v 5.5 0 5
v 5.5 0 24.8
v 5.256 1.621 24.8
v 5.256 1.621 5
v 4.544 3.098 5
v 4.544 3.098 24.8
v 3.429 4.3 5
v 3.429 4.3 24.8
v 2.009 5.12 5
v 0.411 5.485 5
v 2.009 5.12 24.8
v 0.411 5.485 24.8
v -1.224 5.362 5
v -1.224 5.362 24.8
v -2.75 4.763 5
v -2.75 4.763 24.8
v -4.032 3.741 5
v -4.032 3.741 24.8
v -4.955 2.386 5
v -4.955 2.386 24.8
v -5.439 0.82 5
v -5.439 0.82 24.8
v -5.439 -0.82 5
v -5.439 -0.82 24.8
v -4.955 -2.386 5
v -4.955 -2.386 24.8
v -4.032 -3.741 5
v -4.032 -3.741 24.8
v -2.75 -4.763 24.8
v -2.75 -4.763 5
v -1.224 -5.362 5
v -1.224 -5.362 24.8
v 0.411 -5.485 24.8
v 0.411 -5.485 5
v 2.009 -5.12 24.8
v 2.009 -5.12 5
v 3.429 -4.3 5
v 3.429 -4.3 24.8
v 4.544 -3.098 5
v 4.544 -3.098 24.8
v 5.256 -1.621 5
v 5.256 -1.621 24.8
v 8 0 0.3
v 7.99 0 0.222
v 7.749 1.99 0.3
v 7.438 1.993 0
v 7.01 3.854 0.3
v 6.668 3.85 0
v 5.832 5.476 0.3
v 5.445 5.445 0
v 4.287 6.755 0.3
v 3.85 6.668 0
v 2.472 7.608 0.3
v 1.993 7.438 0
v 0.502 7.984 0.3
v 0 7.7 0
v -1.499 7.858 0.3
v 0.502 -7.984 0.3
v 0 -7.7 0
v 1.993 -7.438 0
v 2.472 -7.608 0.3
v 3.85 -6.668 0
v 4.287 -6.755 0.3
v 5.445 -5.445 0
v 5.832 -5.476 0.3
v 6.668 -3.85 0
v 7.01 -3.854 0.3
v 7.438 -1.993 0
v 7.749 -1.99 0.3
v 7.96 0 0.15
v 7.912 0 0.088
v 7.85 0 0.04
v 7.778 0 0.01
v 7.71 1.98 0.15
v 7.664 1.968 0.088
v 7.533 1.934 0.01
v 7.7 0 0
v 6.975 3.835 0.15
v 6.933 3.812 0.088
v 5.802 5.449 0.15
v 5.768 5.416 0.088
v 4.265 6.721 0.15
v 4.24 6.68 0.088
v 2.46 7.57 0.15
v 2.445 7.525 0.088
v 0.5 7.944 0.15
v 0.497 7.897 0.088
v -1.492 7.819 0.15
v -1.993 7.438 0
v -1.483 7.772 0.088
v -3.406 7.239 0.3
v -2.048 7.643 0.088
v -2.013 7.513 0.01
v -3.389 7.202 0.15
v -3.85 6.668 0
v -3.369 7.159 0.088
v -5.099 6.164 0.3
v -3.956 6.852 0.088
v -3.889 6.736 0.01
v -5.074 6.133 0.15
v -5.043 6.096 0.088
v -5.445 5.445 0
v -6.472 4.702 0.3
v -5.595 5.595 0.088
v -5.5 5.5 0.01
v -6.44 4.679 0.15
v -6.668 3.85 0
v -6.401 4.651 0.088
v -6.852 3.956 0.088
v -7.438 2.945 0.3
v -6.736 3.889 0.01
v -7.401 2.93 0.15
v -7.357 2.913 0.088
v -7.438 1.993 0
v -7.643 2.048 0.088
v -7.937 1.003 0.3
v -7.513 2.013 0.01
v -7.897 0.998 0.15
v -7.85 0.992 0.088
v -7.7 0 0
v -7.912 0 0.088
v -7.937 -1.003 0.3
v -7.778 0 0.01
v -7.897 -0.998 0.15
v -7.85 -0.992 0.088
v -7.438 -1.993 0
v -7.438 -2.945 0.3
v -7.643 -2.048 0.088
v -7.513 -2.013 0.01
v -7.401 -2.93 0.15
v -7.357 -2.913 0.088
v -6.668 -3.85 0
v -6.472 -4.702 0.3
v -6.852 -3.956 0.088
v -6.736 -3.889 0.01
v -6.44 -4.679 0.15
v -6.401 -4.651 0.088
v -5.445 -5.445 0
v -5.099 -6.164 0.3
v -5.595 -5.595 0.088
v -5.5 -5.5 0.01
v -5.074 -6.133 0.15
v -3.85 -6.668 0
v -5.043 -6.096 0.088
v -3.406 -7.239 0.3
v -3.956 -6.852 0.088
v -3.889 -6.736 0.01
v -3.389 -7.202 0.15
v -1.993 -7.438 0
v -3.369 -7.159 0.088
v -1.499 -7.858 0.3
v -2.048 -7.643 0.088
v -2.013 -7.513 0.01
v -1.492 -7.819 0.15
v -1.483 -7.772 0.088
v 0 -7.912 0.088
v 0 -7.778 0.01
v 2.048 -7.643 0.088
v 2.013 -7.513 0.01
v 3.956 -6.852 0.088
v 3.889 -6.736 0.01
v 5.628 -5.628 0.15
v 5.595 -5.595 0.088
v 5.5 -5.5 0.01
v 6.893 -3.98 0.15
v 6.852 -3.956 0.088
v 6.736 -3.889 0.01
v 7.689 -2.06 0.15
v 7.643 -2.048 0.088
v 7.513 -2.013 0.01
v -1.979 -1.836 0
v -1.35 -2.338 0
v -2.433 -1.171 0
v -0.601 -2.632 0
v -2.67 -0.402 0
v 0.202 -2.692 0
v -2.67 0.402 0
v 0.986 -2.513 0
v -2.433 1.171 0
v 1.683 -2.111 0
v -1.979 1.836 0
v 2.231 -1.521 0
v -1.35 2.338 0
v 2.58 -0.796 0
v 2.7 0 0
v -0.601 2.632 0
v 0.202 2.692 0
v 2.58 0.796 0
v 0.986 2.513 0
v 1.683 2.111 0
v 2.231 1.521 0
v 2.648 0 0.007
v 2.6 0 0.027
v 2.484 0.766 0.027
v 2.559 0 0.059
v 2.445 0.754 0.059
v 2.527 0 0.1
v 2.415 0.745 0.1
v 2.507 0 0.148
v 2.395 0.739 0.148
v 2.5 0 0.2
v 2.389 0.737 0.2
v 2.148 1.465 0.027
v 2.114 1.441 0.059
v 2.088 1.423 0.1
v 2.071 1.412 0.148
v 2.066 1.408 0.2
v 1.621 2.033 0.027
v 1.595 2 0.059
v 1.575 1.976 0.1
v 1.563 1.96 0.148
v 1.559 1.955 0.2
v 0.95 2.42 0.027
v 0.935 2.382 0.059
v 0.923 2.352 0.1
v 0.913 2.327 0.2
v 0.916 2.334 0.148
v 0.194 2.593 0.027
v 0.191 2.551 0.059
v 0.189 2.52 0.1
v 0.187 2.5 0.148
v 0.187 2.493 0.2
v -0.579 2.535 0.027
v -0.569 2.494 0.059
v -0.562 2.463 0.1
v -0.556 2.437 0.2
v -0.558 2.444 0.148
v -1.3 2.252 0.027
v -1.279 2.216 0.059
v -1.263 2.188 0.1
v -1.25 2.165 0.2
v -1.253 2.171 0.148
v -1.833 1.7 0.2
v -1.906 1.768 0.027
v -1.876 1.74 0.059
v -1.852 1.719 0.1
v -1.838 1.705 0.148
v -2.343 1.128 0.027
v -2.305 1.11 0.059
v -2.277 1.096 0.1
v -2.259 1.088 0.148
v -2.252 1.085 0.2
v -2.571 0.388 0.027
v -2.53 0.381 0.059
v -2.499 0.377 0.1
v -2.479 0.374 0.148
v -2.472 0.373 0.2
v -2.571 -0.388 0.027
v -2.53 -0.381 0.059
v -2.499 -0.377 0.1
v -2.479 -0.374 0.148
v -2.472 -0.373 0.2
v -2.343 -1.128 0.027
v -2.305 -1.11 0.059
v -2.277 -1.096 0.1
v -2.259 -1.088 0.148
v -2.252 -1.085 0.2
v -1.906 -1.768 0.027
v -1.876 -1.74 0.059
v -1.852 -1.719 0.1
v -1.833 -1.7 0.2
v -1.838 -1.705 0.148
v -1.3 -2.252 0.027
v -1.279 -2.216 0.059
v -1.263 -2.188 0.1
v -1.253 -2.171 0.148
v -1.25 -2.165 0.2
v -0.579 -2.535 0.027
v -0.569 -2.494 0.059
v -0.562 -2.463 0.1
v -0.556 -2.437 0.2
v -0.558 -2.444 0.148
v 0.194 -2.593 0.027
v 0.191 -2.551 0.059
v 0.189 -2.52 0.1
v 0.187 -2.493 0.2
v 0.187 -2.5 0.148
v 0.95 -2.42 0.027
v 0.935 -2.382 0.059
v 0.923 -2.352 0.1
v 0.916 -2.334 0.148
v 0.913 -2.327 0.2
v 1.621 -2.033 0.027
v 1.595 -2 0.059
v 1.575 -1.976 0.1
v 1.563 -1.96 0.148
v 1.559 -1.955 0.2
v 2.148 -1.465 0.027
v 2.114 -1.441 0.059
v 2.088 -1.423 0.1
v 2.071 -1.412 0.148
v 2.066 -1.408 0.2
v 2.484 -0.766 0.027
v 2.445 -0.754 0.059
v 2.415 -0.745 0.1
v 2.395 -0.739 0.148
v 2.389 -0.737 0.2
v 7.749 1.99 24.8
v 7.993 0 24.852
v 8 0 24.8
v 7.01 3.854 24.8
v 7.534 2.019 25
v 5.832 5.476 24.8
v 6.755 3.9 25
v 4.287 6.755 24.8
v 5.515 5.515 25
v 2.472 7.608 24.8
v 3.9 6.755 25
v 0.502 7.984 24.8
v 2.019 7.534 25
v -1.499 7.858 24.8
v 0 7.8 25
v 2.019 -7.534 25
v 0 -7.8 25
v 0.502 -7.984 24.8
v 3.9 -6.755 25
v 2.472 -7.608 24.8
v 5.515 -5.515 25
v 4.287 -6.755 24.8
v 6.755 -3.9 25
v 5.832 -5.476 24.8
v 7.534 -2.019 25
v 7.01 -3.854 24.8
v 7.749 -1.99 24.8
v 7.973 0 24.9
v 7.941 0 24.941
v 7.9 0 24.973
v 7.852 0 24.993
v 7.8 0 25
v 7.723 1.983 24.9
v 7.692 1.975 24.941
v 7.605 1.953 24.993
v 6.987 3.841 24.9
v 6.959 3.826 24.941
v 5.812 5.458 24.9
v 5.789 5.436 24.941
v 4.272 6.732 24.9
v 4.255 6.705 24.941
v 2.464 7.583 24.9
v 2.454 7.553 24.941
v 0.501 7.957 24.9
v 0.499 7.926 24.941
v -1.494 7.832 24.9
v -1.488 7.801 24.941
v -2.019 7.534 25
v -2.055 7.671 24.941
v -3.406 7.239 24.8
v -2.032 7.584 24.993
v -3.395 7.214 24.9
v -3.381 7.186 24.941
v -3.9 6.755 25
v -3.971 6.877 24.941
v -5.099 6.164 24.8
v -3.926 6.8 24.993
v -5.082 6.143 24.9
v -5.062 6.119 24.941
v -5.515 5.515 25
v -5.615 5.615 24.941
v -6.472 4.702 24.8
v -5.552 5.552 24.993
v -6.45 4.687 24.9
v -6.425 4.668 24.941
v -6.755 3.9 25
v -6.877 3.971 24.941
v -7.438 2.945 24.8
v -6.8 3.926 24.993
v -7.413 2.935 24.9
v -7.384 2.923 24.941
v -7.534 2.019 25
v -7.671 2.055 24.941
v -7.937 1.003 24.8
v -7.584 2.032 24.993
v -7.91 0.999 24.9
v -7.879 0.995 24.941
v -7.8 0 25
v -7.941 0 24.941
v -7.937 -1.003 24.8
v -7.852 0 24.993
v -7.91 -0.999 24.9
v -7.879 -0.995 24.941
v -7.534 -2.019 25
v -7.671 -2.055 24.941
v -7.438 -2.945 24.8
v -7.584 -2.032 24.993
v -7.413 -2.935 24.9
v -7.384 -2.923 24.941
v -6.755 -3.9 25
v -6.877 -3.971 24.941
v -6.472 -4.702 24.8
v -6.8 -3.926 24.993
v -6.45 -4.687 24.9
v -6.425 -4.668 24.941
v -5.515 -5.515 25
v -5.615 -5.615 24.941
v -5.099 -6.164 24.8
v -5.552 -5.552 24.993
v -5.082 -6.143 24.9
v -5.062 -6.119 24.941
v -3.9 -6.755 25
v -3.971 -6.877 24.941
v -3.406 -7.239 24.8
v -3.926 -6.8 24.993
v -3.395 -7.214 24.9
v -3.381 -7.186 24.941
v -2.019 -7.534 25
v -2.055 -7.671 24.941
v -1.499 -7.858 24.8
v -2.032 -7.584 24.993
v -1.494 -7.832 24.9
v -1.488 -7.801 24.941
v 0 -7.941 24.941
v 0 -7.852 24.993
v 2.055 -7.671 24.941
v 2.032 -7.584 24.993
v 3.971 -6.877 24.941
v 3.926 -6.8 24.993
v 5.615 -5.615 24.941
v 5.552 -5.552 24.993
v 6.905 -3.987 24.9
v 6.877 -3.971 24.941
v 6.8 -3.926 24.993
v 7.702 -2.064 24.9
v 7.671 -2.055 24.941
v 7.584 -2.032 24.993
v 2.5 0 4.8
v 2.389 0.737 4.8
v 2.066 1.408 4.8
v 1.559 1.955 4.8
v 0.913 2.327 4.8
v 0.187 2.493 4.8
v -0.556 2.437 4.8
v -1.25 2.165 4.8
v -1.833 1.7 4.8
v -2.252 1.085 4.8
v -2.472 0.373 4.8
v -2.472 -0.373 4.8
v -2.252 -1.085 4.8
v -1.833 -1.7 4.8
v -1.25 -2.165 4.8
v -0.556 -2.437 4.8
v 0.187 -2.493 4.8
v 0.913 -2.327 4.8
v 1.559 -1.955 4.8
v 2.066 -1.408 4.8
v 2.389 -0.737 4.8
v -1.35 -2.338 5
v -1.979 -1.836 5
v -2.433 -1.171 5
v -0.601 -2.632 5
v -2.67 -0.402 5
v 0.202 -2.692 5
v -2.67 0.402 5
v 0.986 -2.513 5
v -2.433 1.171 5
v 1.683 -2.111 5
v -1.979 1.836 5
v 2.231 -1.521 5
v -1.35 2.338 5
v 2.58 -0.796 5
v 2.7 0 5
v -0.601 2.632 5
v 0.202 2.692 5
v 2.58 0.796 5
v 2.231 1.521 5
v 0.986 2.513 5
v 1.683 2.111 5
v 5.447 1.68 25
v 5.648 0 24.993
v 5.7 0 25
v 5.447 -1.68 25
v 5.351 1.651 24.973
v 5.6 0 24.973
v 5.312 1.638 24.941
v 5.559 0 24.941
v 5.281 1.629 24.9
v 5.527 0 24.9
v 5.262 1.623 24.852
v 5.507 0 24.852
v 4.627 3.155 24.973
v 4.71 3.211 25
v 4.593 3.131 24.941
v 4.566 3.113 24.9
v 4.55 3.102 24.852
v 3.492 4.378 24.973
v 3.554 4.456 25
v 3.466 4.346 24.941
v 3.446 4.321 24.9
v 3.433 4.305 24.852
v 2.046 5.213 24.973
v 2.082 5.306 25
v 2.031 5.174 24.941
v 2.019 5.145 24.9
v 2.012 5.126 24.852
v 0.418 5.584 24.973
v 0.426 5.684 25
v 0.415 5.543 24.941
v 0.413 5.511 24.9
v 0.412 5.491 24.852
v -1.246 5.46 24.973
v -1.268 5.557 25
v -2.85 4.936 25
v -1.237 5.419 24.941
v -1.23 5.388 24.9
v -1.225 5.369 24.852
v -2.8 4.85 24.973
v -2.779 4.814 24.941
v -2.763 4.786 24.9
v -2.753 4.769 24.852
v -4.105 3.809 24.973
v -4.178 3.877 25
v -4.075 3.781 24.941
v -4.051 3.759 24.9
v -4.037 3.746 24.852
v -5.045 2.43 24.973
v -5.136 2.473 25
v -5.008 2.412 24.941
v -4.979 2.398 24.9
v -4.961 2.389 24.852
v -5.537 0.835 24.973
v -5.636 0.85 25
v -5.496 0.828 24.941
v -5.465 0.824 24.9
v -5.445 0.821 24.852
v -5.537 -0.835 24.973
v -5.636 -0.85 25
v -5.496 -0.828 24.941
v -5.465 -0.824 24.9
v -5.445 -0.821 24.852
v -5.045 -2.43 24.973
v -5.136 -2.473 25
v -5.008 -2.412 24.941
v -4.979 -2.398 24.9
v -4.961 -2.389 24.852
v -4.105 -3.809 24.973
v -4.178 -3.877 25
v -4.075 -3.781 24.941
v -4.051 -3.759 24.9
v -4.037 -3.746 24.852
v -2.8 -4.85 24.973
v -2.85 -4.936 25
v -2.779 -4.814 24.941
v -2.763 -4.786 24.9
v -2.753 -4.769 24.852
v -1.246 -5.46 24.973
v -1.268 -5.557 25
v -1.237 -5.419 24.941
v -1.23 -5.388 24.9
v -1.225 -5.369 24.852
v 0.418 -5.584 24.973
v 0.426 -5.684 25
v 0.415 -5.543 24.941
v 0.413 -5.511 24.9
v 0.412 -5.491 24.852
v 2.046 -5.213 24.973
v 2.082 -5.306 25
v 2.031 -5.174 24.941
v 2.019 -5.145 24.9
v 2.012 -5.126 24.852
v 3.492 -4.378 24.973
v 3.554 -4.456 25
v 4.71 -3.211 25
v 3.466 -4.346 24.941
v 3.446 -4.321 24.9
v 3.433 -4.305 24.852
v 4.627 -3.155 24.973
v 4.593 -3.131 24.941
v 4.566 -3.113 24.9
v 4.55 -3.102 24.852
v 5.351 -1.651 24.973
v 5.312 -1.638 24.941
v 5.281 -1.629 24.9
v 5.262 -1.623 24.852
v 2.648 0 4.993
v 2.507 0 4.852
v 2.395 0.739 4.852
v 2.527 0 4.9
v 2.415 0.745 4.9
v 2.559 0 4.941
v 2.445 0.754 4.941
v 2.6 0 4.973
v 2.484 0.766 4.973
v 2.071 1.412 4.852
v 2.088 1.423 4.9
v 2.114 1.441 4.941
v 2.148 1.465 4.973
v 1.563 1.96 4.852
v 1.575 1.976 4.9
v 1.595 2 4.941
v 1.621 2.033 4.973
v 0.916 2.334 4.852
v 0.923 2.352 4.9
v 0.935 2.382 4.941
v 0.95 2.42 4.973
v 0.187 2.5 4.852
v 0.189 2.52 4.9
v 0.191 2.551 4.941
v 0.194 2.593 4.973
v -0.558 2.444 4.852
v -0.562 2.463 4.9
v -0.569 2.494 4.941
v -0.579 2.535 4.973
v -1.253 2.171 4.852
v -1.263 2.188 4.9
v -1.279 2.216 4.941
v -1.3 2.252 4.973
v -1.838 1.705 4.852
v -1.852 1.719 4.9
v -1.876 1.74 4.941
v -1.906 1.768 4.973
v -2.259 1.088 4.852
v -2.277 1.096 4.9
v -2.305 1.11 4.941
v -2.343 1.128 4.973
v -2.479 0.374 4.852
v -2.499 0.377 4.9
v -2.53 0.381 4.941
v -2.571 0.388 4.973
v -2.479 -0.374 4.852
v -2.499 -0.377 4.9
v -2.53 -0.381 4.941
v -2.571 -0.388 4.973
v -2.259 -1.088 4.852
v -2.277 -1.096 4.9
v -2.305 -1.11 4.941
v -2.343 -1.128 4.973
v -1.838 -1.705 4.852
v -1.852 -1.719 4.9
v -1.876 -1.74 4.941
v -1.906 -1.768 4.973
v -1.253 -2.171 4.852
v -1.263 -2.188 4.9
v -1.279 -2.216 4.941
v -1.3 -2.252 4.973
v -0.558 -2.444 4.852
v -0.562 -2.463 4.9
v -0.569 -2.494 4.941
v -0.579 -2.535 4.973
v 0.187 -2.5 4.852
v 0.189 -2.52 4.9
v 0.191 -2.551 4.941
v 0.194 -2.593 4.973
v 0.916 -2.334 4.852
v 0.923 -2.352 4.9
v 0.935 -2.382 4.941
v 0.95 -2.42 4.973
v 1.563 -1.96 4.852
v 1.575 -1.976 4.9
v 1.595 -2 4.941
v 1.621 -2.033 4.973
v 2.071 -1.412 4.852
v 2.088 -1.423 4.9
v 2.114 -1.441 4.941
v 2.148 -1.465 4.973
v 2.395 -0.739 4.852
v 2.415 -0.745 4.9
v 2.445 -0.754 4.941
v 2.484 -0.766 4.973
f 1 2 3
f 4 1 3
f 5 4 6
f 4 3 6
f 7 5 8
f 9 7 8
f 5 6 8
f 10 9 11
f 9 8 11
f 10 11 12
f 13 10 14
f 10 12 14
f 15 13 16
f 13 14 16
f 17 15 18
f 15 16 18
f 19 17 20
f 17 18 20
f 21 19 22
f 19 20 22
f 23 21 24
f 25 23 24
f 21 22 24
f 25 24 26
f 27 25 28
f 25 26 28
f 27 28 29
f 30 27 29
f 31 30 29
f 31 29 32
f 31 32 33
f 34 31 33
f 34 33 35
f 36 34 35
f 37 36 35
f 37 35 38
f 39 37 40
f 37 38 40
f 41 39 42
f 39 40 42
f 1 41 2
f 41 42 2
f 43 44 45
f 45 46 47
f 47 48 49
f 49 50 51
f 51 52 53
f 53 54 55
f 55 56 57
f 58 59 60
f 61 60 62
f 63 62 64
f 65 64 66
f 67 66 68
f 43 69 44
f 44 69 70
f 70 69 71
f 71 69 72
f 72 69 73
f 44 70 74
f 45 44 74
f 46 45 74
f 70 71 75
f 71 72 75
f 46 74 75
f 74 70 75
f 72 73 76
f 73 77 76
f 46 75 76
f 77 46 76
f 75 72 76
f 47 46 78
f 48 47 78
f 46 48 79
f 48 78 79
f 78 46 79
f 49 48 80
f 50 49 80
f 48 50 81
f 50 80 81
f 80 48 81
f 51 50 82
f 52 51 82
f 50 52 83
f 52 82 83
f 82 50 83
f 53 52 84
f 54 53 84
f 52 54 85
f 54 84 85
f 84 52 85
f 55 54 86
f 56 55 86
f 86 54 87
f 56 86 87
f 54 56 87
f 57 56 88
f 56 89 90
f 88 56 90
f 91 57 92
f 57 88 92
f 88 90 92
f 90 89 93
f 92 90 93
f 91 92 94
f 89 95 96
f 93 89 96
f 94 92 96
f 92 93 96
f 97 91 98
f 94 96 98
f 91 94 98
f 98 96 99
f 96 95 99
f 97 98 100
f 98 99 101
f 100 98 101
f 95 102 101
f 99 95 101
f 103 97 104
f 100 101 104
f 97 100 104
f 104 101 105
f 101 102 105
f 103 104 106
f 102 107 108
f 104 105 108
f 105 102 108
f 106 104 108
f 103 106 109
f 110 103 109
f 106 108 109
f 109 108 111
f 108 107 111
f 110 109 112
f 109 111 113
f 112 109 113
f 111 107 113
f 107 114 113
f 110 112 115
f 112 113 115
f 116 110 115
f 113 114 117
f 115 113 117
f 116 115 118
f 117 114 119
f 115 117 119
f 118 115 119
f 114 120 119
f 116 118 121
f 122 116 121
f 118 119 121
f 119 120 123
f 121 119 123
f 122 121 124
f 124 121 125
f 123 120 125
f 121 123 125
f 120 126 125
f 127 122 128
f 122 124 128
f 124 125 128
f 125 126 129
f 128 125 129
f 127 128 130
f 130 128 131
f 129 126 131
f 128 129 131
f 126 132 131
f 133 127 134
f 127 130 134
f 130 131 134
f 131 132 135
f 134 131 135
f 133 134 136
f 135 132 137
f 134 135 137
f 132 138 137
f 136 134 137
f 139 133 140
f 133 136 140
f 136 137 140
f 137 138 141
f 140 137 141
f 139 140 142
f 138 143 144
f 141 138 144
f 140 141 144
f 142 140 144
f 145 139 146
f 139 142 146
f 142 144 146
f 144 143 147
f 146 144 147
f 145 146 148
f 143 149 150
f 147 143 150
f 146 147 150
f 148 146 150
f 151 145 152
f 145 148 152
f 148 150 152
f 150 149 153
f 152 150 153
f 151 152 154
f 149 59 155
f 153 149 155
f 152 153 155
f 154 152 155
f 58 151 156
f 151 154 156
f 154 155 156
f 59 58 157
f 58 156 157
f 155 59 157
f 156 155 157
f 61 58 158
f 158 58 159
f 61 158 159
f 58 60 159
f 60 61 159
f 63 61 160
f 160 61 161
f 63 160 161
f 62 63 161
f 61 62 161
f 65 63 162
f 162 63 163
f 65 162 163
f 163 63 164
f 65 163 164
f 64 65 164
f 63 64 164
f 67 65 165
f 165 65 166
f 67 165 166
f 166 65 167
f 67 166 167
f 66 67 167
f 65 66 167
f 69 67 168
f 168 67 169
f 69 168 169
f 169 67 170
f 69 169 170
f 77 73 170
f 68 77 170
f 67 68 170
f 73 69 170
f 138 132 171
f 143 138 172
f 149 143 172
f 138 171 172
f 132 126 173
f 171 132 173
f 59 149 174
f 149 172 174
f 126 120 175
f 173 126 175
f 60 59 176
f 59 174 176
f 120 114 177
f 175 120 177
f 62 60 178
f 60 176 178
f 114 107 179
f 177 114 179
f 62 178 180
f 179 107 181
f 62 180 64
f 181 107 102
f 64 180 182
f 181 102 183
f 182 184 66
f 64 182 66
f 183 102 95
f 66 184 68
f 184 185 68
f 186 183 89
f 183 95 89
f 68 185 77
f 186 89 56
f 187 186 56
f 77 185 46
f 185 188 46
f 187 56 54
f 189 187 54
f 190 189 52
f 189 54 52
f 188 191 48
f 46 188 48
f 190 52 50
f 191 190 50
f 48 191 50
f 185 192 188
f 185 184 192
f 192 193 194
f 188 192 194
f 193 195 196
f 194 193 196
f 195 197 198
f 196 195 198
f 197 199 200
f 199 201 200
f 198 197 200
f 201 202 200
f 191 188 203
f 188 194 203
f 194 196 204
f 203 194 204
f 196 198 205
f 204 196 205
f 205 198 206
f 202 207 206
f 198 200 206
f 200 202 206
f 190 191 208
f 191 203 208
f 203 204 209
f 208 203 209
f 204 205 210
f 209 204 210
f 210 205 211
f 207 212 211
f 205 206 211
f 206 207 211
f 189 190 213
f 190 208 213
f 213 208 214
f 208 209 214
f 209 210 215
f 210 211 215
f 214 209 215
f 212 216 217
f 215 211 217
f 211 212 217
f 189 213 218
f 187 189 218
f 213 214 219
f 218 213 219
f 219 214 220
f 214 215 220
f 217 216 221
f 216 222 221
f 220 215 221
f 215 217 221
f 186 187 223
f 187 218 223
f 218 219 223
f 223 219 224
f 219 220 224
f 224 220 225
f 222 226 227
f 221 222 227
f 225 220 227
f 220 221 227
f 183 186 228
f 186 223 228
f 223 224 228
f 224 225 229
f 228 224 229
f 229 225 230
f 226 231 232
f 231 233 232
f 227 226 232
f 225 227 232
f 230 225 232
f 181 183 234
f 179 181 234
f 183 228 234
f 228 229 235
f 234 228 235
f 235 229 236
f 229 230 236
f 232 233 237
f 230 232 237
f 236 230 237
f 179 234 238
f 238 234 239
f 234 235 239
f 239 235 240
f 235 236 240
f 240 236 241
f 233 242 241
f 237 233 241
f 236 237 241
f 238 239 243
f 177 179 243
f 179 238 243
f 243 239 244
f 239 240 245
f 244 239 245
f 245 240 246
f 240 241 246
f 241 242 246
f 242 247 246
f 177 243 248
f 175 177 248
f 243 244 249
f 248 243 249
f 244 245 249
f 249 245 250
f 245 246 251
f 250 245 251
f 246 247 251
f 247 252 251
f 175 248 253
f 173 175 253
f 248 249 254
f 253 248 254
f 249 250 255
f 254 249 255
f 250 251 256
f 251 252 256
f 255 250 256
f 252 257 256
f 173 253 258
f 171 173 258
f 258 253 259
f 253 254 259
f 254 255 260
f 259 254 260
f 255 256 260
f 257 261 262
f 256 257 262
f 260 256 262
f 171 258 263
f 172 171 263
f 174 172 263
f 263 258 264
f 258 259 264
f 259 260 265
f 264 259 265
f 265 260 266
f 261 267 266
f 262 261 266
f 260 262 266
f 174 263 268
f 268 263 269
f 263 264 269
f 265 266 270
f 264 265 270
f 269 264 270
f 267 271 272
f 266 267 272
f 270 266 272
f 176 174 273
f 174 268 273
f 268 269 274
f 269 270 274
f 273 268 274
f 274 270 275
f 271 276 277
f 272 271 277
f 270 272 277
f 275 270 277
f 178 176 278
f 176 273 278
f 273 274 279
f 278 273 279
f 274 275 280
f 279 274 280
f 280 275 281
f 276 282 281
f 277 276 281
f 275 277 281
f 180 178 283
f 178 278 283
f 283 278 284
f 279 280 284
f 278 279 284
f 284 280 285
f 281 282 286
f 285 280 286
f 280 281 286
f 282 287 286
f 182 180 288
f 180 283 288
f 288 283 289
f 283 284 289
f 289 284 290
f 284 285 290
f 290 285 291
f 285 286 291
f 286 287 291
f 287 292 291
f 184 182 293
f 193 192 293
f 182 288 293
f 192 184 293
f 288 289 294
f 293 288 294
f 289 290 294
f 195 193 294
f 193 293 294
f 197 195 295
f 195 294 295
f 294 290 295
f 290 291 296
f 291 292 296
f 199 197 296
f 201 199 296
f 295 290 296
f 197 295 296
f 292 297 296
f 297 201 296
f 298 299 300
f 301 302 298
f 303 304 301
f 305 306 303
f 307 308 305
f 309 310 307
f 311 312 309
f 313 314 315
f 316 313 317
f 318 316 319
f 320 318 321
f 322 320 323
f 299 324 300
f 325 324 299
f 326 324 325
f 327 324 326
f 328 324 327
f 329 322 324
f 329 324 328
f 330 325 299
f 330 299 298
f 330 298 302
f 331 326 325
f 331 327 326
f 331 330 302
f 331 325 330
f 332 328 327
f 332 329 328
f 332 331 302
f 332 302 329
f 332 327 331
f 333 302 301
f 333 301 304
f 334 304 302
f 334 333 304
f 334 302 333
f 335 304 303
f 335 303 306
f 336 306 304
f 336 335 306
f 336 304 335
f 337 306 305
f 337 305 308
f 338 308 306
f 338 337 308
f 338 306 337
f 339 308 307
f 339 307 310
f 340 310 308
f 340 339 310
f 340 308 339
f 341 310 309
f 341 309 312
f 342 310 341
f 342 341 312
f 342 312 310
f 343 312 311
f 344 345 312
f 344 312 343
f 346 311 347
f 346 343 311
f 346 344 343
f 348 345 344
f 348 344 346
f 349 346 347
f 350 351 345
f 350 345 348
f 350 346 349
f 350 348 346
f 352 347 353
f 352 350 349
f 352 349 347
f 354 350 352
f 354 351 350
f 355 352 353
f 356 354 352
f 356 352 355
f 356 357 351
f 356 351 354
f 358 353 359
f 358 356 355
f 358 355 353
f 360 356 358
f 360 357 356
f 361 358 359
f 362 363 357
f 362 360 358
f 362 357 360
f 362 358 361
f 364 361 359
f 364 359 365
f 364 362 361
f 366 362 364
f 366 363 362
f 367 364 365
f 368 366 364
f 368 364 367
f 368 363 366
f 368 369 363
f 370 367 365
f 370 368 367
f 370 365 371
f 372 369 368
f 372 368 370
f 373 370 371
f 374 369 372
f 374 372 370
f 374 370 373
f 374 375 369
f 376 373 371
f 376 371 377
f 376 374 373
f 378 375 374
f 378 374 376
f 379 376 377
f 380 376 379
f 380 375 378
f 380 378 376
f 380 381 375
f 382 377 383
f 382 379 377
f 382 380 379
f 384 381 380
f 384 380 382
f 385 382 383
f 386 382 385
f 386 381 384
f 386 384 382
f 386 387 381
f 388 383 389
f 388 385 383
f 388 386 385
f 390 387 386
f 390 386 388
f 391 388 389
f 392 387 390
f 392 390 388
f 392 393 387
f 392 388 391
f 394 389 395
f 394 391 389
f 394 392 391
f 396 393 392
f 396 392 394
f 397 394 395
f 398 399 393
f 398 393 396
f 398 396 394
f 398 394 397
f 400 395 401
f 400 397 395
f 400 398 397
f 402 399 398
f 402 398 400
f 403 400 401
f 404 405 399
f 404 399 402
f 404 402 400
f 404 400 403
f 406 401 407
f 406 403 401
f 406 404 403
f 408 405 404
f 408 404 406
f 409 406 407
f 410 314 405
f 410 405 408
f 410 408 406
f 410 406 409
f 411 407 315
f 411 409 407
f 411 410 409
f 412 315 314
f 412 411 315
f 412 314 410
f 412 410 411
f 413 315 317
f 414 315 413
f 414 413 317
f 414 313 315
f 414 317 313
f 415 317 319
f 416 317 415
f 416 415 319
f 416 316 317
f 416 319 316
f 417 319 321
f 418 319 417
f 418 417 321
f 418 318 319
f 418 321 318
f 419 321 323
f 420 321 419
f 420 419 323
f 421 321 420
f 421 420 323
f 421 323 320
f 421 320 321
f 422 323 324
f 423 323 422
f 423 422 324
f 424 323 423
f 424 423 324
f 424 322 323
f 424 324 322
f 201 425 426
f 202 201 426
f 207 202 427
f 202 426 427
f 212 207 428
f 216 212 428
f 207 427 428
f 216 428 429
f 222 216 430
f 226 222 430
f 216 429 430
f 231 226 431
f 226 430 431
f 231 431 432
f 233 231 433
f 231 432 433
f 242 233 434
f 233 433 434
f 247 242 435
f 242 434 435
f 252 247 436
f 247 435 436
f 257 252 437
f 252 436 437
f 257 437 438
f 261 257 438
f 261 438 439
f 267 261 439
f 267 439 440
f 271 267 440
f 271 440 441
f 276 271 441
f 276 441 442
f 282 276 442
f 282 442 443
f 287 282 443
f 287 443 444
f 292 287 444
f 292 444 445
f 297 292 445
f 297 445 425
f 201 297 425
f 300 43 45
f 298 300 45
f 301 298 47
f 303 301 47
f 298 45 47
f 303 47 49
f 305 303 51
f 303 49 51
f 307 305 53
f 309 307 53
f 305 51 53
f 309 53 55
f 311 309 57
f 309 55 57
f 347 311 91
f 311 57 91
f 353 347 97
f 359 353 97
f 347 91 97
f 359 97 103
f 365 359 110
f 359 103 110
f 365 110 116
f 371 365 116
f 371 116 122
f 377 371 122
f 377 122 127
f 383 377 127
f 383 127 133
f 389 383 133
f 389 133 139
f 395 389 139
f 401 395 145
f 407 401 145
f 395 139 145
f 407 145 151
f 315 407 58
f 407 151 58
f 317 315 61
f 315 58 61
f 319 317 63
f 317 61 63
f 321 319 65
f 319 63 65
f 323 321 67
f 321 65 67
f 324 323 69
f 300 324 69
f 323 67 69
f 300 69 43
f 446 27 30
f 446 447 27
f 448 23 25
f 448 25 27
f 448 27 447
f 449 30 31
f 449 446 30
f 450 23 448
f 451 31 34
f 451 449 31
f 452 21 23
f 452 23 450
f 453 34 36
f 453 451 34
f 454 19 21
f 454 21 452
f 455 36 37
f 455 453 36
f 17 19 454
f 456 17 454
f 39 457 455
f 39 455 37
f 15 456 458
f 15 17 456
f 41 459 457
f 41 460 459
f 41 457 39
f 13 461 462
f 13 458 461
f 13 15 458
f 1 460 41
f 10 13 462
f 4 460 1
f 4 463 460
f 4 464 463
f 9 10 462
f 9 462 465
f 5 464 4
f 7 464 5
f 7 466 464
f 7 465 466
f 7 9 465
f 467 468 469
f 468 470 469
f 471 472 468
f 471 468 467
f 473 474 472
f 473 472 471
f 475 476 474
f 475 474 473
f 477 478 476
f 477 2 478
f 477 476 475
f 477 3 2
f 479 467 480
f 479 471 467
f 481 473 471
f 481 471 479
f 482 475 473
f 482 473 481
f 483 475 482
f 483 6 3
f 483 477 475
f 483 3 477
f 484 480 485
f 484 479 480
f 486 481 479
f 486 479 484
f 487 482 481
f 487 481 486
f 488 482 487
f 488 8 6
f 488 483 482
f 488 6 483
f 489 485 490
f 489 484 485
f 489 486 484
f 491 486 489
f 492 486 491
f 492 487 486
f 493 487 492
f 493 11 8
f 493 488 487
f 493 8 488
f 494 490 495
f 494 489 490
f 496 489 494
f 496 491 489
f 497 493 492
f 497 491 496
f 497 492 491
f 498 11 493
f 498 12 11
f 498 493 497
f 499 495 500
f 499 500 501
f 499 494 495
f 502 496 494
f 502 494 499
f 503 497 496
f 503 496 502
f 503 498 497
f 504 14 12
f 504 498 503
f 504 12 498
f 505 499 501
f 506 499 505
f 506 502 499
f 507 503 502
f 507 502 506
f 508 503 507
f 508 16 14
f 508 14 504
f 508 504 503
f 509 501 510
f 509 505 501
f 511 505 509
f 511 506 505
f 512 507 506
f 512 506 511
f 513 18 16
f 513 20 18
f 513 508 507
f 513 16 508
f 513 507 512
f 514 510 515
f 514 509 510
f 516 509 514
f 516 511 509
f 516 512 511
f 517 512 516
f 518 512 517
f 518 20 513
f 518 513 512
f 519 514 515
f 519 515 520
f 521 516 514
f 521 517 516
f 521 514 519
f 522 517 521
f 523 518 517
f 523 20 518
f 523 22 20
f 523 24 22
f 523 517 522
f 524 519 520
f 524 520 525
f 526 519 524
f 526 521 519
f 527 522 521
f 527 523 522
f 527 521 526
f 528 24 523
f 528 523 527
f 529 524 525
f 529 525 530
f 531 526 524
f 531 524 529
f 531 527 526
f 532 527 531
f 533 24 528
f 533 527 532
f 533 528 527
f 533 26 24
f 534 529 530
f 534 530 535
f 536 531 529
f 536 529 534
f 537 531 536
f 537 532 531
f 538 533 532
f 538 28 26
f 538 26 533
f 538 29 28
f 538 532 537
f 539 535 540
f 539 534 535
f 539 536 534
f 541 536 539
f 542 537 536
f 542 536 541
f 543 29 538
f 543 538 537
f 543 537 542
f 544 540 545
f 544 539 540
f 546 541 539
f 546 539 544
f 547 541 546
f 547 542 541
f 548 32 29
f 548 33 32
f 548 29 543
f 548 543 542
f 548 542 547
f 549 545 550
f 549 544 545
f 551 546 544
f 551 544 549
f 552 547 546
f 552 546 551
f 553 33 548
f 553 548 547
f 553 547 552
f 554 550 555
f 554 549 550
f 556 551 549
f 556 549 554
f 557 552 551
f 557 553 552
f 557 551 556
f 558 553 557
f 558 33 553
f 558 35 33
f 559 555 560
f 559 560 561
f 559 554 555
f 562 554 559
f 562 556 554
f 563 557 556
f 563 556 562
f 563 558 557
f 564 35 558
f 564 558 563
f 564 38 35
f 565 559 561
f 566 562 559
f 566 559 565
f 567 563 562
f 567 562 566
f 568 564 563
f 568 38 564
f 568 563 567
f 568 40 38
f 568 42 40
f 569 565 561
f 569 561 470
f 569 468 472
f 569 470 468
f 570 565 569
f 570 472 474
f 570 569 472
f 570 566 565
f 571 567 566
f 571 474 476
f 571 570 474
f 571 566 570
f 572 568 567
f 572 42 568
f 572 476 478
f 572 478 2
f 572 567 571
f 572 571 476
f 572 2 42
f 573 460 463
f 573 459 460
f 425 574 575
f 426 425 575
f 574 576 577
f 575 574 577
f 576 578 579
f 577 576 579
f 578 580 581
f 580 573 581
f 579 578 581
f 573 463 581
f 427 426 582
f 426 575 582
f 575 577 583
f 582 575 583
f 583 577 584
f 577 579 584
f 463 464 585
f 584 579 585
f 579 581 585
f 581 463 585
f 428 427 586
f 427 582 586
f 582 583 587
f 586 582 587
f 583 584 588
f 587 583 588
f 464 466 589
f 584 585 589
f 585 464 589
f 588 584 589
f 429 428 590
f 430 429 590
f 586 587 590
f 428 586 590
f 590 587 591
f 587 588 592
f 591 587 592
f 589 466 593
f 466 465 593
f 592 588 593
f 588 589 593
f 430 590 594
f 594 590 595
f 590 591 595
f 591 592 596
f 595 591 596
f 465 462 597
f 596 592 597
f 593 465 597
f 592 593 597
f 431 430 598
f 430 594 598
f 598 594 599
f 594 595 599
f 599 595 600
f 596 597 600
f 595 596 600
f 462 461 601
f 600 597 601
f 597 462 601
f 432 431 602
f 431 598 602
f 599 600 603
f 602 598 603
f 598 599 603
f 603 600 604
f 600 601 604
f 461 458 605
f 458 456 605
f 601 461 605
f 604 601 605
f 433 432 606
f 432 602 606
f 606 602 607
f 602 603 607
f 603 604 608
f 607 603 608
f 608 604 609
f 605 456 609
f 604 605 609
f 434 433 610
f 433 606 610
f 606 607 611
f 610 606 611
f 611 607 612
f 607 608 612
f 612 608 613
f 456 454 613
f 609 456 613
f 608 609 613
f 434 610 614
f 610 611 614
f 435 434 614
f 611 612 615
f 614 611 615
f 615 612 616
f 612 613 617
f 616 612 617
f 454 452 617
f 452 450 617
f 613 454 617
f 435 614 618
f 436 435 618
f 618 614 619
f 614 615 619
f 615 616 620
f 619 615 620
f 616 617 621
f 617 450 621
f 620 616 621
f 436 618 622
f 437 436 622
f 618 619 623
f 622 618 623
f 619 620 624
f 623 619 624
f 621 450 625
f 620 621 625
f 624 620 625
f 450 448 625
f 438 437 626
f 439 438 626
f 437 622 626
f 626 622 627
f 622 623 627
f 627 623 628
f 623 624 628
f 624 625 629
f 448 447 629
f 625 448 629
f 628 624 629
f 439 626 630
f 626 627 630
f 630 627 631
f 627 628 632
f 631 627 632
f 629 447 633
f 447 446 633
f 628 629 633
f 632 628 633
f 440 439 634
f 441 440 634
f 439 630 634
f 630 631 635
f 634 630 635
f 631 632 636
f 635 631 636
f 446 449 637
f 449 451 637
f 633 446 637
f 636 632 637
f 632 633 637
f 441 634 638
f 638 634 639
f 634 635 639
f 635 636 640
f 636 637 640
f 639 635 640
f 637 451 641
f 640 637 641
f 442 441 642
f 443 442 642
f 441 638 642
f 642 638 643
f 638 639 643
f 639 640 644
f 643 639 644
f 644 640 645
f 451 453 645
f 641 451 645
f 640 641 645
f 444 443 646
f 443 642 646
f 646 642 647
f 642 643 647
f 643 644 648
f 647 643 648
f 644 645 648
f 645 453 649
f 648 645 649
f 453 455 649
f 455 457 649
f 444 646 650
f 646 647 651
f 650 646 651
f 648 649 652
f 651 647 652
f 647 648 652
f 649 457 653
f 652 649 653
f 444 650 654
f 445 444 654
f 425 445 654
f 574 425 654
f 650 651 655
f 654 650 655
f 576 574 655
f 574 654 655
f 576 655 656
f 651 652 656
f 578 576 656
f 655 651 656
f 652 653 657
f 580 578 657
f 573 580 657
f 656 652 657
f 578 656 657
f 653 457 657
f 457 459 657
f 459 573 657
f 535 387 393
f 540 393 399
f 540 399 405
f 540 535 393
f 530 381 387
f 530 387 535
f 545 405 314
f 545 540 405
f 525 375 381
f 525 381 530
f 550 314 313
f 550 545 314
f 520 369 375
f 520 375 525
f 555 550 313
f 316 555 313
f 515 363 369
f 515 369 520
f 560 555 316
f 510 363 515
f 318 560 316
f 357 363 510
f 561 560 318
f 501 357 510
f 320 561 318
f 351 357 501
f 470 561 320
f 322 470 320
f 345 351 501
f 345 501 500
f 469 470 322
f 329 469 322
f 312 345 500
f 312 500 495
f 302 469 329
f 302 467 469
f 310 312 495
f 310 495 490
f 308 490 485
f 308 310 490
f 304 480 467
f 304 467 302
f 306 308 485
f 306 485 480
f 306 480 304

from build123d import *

# Parameters (mm, degrees)
SKETCH1_R           = 8
BOSS_EXTRUDE1_DEPTH = 25
SKETCH2_R           = 5.5
CUT_EXTRUDE1_DEPTH  = 20
SKETCH3_R           = 2.5
CUT_EXTRUDE2_DEPTH  = 6
FILLET1_R           = 0.2
FILLET2_R           = 0.3


with BuildPart() as part:
    # Sketch1 → Boss-Extrude1 (new body)
    with BuildSketch(Plane.XY):
        Circle(SKETCH1_R)
    extrude(amount=BOSS_EXTRUDE1_DEPTH)

    # Sketch2 → Cut-Extrude1 (cut)
    with BuildSketch(Plane.XY.offset(25)):
        Circle(SKETCH2_R)
    extrude(amount=-CUT_EXTRUDE1_DEPTH, mode=Mode.SUBTRACT)

    # Sketch3 → Cut-Extrude2 (cut, through all)
    with BuildSketch(Plane.XY.offset(5)):
        Circle(SKETCH3_R)
    extrude(amount=-CUT_EXTRUDE2_DEPTH, mode=Mode.SUBTRACT)

    # Fillet1
    fillet1_edges = [part.edges().sort_by_distance(p)[0] for p in [
        (-2.5, 0, 0),
        (-2.5, 0, 5),
        (-8, 0, 25),
        (-5.5, 0, 25),
    ]]
    fillet(fillet1_edges, radius=FILLET1_R)

    # Fillet2
    fillet2_edges = [part.edges().sort_by_distance(p)[0] for p in [
        (-8, 0, 0),
    ]]
    fillet(fillet2_edges, radius=FILLET2_R)


solid = part.part
